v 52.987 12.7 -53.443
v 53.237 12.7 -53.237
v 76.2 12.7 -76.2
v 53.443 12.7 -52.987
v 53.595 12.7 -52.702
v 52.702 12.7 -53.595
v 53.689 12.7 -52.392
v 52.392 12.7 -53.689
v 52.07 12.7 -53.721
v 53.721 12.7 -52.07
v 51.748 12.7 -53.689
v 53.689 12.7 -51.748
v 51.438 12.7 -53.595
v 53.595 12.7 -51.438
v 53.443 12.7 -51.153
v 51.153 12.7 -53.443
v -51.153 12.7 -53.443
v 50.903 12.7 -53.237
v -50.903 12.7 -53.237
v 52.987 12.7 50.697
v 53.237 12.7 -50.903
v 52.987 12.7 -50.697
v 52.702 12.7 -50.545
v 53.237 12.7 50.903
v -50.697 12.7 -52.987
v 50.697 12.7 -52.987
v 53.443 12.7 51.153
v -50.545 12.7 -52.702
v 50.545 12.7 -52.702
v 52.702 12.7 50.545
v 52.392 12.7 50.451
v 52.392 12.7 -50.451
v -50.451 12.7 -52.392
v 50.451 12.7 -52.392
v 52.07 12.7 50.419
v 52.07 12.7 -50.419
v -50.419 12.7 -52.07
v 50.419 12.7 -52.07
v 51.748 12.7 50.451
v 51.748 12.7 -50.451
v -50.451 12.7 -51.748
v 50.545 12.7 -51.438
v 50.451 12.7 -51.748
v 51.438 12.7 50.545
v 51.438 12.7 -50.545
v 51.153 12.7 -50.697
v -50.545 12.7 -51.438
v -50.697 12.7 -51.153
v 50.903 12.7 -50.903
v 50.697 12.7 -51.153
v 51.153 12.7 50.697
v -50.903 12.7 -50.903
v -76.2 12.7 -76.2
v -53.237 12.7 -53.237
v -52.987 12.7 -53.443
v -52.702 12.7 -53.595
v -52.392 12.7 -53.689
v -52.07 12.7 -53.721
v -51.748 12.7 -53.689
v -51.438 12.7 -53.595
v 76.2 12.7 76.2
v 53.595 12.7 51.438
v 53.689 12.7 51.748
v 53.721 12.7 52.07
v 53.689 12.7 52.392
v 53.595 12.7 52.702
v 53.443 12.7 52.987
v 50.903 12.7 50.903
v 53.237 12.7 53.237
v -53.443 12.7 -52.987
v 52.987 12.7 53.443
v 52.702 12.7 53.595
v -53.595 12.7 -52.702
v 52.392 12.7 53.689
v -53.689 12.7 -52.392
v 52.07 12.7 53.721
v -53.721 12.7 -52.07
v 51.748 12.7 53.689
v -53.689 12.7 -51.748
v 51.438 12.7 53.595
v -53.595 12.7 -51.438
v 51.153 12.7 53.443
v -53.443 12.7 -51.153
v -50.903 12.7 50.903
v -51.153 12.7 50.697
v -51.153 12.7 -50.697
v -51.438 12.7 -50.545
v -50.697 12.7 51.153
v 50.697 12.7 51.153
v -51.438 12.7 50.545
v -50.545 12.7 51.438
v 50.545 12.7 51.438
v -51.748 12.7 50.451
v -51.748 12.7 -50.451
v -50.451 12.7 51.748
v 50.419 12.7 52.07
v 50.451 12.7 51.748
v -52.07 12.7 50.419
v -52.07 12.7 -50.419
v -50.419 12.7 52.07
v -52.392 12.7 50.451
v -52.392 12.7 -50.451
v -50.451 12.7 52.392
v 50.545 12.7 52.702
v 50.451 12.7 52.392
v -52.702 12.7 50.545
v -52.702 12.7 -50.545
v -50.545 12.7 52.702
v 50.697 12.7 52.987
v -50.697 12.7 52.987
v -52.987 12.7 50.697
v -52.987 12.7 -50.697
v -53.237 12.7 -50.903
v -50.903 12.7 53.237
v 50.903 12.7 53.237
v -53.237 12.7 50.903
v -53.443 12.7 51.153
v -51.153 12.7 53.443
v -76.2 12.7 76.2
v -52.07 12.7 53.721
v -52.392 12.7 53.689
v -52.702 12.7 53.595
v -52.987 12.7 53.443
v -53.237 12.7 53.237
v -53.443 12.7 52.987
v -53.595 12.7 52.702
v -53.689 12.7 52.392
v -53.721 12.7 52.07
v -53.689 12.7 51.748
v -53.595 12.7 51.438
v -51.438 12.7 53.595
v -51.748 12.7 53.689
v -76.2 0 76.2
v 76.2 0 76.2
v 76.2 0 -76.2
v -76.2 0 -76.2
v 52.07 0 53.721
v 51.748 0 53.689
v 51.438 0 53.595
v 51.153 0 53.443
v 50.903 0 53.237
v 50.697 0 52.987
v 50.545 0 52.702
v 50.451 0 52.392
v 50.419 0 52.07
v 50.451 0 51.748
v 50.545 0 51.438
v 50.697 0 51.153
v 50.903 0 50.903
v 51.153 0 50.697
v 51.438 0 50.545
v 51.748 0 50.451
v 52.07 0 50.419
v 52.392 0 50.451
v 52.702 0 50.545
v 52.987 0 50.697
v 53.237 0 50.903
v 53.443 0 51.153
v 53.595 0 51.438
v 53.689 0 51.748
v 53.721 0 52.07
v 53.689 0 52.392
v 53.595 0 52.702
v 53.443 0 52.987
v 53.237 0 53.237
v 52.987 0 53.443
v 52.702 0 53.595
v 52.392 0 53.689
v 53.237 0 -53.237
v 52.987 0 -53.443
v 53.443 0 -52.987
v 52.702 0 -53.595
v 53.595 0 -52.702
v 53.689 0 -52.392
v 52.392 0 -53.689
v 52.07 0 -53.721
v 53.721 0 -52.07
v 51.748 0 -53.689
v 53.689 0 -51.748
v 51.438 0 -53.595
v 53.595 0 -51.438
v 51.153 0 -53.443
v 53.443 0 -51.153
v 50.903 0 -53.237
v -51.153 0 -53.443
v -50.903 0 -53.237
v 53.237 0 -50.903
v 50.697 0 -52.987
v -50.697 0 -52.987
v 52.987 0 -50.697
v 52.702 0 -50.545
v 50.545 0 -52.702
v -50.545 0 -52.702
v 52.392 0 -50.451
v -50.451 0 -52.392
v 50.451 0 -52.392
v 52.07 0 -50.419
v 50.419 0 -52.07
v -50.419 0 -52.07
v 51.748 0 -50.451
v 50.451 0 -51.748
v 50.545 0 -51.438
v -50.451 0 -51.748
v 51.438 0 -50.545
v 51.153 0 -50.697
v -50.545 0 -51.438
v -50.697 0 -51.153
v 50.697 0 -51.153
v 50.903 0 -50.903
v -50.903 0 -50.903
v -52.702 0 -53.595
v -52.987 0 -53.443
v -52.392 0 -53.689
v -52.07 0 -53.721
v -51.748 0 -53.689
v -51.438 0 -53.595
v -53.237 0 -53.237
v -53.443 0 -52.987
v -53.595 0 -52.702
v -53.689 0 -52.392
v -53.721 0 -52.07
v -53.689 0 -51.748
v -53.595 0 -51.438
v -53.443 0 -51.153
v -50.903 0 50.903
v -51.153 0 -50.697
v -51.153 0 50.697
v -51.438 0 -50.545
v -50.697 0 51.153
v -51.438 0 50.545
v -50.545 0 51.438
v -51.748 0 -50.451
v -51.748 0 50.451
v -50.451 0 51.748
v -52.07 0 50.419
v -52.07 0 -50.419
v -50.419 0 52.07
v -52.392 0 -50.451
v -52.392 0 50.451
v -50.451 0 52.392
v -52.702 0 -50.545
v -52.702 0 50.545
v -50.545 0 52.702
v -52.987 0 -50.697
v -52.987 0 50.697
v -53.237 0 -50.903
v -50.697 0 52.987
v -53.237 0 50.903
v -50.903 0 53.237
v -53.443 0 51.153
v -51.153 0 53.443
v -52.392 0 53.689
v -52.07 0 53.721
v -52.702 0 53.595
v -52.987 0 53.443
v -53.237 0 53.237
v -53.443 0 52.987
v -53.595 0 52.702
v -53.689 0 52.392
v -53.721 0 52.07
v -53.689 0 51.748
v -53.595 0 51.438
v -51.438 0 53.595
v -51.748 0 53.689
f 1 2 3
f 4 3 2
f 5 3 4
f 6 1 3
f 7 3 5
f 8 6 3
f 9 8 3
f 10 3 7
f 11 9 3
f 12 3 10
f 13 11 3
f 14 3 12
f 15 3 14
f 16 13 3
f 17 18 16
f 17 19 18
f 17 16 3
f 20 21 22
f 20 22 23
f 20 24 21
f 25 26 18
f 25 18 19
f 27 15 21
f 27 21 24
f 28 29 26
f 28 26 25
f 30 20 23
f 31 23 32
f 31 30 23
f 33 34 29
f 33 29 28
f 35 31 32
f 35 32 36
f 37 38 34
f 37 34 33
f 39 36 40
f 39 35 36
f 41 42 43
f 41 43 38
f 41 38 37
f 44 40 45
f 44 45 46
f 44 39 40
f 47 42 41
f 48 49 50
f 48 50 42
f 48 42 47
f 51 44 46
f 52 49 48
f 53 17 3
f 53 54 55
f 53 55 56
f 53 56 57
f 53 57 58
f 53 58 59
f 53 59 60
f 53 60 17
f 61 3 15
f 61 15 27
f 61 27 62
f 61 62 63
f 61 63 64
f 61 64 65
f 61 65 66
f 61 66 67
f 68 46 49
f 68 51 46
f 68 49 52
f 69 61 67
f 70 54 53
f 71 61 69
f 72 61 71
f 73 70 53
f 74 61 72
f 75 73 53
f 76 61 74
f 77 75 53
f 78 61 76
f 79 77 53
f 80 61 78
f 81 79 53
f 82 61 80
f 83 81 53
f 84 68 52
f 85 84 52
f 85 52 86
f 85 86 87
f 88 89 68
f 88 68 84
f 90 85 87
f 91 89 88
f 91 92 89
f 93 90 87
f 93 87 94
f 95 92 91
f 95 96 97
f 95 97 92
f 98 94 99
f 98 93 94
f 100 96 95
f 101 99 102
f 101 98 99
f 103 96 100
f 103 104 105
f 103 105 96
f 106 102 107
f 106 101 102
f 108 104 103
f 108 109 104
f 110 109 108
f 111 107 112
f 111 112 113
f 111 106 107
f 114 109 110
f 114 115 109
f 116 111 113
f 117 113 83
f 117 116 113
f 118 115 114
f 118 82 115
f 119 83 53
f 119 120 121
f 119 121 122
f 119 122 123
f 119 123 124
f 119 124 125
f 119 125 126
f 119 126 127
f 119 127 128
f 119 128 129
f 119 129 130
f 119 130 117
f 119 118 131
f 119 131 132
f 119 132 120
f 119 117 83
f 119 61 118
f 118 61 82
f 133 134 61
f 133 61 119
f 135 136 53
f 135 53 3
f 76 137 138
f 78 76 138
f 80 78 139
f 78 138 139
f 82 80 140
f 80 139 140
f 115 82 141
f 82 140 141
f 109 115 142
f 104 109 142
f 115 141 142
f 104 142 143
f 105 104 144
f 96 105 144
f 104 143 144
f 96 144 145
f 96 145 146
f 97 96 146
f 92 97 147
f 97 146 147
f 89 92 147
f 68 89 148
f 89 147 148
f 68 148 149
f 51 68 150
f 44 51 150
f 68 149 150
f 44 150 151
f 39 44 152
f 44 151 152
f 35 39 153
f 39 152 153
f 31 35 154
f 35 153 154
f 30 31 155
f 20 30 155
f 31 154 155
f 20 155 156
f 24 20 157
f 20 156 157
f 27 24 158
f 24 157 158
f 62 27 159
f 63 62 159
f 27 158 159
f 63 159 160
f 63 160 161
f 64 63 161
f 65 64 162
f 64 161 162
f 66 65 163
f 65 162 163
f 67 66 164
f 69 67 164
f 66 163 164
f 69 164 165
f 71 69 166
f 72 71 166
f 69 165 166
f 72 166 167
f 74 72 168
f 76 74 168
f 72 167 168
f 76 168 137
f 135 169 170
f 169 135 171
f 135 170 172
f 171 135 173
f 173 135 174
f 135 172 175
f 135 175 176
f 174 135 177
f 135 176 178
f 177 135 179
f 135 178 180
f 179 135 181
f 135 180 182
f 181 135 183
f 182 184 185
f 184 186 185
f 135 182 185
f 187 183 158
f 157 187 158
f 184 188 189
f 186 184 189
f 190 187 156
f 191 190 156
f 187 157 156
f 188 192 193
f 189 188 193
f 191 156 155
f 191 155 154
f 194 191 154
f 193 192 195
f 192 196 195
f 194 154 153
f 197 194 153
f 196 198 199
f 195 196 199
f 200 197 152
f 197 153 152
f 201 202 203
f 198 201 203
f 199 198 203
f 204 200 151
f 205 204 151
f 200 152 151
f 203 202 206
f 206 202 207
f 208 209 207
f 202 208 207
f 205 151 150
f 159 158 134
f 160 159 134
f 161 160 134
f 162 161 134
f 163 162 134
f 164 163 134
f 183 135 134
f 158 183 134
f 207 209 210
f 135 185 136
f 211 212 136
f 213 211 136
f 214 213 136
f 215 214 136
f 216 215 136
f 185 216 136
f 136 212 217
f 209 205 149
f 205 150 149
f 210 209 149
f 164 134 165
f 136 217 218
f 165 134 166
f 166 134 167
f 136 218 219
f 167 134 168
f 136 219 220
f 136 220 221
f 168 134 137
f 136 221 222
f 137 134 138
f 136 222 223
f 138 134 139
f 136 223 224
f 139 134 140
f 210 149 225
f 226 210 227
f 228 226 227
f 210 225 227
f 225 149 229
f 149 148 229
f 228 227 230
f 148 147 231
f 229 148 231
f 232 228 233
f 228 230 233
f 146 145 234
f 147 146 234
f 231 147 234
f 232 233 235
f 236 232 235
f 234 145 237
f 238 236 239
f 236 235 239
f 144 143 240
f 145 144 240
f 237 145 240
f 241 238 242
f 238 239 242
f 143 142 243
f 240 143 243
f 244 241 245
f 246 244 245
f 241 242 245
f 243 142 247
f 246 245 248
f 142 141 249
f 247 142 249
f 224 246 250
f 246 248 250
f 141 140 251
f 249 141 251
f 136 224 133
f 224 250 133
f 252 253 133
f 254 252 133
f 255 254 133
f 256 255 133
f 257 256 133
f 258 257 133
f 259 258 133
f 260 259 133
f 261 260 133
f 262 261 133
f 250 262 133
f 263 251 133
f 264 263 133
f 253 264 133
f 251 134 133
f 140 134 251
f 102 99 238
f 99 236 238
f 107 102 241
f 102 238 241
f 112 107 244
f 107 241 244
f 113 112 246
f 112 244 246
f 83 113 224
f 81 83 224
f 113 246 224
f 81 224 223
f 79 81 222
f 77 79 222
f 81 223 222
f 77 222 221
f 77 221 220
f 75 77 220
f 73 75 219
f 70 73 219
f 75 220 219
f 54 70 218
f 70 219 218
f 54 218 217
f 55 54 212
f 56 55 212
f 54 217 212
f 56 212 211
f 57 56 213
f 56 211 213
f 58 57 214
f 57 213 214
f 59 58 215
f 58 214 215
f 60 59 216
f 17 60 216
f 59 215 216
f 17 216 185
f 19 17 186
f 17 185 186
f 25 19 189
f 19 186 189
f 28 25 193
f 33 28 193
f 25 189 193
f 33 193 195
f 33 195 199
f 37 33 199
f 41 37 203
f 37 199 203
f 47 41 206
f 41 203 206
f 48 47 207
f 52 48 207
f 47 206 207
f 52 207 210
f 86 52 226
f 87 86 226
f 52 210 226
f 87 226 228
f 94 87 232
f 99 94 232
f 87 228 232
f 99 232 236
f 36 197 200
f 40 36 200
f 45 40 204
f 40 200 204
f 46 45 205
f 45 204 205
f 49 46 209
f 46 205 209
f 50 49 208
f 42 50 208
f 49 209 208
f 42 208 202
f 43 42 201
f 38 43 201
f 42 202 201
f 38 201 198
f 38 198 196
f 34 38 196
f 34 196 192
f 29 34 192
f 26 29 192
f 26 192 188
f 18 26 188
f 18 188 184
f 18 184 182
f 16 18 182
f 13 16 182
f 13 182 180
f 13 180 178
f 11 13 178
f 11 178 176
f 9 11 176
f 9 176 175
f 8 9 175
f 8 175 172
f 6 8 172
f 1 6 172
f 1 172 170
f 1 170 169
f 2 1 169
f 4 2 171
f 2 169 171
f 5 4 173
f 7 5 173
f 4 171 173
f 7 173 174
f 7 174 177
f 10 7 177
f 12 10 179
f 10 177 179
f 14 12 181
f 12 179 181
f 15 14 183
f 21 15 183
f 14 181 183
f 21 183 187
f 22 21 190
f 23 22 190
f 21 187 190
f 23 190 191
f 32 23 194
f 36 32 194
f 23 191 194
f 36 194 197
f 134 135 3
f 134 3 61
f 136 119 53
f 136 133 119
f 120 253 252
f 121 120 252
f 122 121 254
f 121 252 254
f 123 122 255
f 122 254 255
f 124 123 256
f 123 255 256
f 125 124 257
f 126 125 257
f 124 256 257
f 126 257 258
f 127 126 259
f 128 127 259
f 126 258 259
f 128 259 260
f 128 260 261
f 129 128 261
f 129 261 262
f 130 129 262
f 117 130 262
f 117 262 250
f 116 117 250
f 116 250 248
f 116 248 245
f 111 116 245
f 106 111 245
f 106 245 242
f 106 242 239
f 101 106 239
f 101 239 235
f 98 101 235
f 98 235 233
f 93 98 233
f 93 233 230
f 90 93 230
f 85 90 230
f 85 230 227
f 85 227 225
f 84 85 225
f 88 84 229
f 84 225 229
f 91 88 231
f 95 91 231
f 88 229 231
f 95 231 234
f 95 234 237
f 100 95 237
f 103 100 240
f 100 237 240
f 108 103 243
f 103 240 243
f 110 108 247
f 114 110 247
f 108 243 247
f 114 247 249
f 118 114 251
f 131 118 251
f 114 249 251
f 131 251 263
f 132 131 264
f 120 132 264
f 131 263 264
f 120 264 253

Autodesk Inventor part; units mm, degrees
ref_plane "YZ Plane" through (0, 0, 0) normal (1, 0, 0) x (0, 1, 0)
ref_plane "XZ Plane" through (0, 0, 0) normal (0, 1, 0) x (-1, 0, 0)
ref_plane "XY Plane" through (0, 0, 0) normal (0, 0, 1) x (1, 0, 0)
sketch "Sketch1" plane through (0, 0, 0) normal (0, 1, 0) x (-1, 0, 0)
  line L0 (76.2, -76.2) -> (-76.2, -76.2)
  line L1 (-76.2, -76.2) -> (-76.2, 76.2)
  line L2 (-76.2, 76.2) -> (76.2, 76.2)
  line L3 (76.2, 76.2) -> (76.2, -76.2)
  point P0 (0, 0)
  point P1 (-76.2, 0)
  point P2 (0, -76.2)
  dimension "d0" = 152.4
  dimension "d1" = 152.4
extrude "Extrusion1" add sketch "Sketch1" along normal blind 12.7
sketch "Sketch3" plane through (0, 12.7, 0) normal (0, 1, 0) x (1, 0, 0)
  line L0 (-57.15, 57.15) -> (57.15, 57.15)
  line L1 (57.15, 57.15) -> (57.15, -57.15)
  line L2 (57.15, -57.15) -> (-57.15, -57.15)
  line L3 (-57.15, -57.15) -> (-57.15, 57.15)
  point P0 (0, 0)
  point P1 (-57.15, 0)
  point P2 (0, 57.15)
  point P3 (-52.07, 52.07)
  point P4 (52.07, 52.07)
  point P5 (52.07, -52.07)
  point P6 (-52.07, -52.07)
  dimension "d17" = 114.3
  dimension "d18" = 114.3
  dimension "d26" = 5.08
  dimension "d27" = 5.08
  dimension "d28" = 5.08
  dimension "d29" = 5.08
  dimension "d30" = 5.08
  dimension "d31" = 5.08
  dimension "d32" = 5.08
  dimension "d33" = 5.08
hole "Hole1" at (-52.07, 12.7, -52.07) at (52.07, 12.7, -52.07) at (52.07, 12.7, 52.07) at (-52.07, 12.7, 52.07) direction (0, -1, 0) diameter 3.302 end through all thread size "8-32 UNC" class "2B" standard "ANSI Unified Screw Threads"
sketch "Sketch4" plane through (0, 12.7, 0) normal (0, 1, 0) x (1, 0, 0)
  line L0 (-55.5625, 55.4863) -> (58.7375, 55.4863)
  line L1 (58.7375, 55.4863) -> (58.7375, -58.8137)
  line L2 (58.7375, -58.8137) -> (-55.5625, -58.8137)
  line L3 (-55.5625, -58.8137) -> (-55.5625, 55.4863)
  line L4 (-30.1625, -52.4129) -> (23.1775, -52.4129)
  line L5 (23.1775, -52.4129) -> (23.1775, 49.1871)
  line L6 (23.1775, 49.1871) -> (-30.1625, 49.1871)
  line L7 (-30.1625, 49.1871) -> (-30.1625, -52.4129)
  circle A0 centre (-27.6225, -37.1729) radius 1.5875
  circle A1 centre (20.6375, -38.4429) radius 1.5875
  circle A2 centre (20.6375, 44.1071) radius 1.5875
  circle A3 centre (-27.6225, 37.7571) radius 1.5875
  point P0 (0, 0)
  dimension "d34" = 114.3
  dimension "d35" = 114.3
  dimension "d36" = 53.34
  dimension "d37" = 101.6
  dimension "d38" = 3.175
  dimension "d39" = 15.24
  dimension "d40" = 2.54
  dimension "d41" = 2.54
  dimension "d42" = 13.97
  dimension "d43" = 96.52
  dimension "d44" = 2.54
  dimension "d45" = 90.17
  dimension "d46" = 2.54
  dimension "d47" = 25.4
  dimension "d70" = 6.4008
hole "Hole2" [suppressed]
sketch "Sketch7" plane through (0, 0, 0) normal (0, -1, 0) x (1, 0, 0)
  circle A0 centre (-27.6225, 37.1729) radius 3.3782 projected
  circle A1 centre (-27.6225, 37.1729) radius 6.35
  circle A2 centre (20.6375, 38.4429) radius 3.3782 projected
  circle A3 centre (20.6375, 38.4429) radius 6.35
  circle A4 centre (20.6375, -44.1071) radius 3.3782 projected
  circle A5 centre (20.6375, -44.1071) radius 6.35
  circle A6 centre (-27.6225, -37.7571) radius 3.3782 projected
  circle A7 centre (-27.6225, -37.7571) radius 6.35
  point P0 (0, 0)
  dimension "d63" = 12.7
  dimension "d64" = 12.7
  dimension "d65" = 12.7
  dimension "d66" = 12.7
extrude "Extrusion3" [suppressed]
properties part number "BasePlate" material "Aluminum 6061"
